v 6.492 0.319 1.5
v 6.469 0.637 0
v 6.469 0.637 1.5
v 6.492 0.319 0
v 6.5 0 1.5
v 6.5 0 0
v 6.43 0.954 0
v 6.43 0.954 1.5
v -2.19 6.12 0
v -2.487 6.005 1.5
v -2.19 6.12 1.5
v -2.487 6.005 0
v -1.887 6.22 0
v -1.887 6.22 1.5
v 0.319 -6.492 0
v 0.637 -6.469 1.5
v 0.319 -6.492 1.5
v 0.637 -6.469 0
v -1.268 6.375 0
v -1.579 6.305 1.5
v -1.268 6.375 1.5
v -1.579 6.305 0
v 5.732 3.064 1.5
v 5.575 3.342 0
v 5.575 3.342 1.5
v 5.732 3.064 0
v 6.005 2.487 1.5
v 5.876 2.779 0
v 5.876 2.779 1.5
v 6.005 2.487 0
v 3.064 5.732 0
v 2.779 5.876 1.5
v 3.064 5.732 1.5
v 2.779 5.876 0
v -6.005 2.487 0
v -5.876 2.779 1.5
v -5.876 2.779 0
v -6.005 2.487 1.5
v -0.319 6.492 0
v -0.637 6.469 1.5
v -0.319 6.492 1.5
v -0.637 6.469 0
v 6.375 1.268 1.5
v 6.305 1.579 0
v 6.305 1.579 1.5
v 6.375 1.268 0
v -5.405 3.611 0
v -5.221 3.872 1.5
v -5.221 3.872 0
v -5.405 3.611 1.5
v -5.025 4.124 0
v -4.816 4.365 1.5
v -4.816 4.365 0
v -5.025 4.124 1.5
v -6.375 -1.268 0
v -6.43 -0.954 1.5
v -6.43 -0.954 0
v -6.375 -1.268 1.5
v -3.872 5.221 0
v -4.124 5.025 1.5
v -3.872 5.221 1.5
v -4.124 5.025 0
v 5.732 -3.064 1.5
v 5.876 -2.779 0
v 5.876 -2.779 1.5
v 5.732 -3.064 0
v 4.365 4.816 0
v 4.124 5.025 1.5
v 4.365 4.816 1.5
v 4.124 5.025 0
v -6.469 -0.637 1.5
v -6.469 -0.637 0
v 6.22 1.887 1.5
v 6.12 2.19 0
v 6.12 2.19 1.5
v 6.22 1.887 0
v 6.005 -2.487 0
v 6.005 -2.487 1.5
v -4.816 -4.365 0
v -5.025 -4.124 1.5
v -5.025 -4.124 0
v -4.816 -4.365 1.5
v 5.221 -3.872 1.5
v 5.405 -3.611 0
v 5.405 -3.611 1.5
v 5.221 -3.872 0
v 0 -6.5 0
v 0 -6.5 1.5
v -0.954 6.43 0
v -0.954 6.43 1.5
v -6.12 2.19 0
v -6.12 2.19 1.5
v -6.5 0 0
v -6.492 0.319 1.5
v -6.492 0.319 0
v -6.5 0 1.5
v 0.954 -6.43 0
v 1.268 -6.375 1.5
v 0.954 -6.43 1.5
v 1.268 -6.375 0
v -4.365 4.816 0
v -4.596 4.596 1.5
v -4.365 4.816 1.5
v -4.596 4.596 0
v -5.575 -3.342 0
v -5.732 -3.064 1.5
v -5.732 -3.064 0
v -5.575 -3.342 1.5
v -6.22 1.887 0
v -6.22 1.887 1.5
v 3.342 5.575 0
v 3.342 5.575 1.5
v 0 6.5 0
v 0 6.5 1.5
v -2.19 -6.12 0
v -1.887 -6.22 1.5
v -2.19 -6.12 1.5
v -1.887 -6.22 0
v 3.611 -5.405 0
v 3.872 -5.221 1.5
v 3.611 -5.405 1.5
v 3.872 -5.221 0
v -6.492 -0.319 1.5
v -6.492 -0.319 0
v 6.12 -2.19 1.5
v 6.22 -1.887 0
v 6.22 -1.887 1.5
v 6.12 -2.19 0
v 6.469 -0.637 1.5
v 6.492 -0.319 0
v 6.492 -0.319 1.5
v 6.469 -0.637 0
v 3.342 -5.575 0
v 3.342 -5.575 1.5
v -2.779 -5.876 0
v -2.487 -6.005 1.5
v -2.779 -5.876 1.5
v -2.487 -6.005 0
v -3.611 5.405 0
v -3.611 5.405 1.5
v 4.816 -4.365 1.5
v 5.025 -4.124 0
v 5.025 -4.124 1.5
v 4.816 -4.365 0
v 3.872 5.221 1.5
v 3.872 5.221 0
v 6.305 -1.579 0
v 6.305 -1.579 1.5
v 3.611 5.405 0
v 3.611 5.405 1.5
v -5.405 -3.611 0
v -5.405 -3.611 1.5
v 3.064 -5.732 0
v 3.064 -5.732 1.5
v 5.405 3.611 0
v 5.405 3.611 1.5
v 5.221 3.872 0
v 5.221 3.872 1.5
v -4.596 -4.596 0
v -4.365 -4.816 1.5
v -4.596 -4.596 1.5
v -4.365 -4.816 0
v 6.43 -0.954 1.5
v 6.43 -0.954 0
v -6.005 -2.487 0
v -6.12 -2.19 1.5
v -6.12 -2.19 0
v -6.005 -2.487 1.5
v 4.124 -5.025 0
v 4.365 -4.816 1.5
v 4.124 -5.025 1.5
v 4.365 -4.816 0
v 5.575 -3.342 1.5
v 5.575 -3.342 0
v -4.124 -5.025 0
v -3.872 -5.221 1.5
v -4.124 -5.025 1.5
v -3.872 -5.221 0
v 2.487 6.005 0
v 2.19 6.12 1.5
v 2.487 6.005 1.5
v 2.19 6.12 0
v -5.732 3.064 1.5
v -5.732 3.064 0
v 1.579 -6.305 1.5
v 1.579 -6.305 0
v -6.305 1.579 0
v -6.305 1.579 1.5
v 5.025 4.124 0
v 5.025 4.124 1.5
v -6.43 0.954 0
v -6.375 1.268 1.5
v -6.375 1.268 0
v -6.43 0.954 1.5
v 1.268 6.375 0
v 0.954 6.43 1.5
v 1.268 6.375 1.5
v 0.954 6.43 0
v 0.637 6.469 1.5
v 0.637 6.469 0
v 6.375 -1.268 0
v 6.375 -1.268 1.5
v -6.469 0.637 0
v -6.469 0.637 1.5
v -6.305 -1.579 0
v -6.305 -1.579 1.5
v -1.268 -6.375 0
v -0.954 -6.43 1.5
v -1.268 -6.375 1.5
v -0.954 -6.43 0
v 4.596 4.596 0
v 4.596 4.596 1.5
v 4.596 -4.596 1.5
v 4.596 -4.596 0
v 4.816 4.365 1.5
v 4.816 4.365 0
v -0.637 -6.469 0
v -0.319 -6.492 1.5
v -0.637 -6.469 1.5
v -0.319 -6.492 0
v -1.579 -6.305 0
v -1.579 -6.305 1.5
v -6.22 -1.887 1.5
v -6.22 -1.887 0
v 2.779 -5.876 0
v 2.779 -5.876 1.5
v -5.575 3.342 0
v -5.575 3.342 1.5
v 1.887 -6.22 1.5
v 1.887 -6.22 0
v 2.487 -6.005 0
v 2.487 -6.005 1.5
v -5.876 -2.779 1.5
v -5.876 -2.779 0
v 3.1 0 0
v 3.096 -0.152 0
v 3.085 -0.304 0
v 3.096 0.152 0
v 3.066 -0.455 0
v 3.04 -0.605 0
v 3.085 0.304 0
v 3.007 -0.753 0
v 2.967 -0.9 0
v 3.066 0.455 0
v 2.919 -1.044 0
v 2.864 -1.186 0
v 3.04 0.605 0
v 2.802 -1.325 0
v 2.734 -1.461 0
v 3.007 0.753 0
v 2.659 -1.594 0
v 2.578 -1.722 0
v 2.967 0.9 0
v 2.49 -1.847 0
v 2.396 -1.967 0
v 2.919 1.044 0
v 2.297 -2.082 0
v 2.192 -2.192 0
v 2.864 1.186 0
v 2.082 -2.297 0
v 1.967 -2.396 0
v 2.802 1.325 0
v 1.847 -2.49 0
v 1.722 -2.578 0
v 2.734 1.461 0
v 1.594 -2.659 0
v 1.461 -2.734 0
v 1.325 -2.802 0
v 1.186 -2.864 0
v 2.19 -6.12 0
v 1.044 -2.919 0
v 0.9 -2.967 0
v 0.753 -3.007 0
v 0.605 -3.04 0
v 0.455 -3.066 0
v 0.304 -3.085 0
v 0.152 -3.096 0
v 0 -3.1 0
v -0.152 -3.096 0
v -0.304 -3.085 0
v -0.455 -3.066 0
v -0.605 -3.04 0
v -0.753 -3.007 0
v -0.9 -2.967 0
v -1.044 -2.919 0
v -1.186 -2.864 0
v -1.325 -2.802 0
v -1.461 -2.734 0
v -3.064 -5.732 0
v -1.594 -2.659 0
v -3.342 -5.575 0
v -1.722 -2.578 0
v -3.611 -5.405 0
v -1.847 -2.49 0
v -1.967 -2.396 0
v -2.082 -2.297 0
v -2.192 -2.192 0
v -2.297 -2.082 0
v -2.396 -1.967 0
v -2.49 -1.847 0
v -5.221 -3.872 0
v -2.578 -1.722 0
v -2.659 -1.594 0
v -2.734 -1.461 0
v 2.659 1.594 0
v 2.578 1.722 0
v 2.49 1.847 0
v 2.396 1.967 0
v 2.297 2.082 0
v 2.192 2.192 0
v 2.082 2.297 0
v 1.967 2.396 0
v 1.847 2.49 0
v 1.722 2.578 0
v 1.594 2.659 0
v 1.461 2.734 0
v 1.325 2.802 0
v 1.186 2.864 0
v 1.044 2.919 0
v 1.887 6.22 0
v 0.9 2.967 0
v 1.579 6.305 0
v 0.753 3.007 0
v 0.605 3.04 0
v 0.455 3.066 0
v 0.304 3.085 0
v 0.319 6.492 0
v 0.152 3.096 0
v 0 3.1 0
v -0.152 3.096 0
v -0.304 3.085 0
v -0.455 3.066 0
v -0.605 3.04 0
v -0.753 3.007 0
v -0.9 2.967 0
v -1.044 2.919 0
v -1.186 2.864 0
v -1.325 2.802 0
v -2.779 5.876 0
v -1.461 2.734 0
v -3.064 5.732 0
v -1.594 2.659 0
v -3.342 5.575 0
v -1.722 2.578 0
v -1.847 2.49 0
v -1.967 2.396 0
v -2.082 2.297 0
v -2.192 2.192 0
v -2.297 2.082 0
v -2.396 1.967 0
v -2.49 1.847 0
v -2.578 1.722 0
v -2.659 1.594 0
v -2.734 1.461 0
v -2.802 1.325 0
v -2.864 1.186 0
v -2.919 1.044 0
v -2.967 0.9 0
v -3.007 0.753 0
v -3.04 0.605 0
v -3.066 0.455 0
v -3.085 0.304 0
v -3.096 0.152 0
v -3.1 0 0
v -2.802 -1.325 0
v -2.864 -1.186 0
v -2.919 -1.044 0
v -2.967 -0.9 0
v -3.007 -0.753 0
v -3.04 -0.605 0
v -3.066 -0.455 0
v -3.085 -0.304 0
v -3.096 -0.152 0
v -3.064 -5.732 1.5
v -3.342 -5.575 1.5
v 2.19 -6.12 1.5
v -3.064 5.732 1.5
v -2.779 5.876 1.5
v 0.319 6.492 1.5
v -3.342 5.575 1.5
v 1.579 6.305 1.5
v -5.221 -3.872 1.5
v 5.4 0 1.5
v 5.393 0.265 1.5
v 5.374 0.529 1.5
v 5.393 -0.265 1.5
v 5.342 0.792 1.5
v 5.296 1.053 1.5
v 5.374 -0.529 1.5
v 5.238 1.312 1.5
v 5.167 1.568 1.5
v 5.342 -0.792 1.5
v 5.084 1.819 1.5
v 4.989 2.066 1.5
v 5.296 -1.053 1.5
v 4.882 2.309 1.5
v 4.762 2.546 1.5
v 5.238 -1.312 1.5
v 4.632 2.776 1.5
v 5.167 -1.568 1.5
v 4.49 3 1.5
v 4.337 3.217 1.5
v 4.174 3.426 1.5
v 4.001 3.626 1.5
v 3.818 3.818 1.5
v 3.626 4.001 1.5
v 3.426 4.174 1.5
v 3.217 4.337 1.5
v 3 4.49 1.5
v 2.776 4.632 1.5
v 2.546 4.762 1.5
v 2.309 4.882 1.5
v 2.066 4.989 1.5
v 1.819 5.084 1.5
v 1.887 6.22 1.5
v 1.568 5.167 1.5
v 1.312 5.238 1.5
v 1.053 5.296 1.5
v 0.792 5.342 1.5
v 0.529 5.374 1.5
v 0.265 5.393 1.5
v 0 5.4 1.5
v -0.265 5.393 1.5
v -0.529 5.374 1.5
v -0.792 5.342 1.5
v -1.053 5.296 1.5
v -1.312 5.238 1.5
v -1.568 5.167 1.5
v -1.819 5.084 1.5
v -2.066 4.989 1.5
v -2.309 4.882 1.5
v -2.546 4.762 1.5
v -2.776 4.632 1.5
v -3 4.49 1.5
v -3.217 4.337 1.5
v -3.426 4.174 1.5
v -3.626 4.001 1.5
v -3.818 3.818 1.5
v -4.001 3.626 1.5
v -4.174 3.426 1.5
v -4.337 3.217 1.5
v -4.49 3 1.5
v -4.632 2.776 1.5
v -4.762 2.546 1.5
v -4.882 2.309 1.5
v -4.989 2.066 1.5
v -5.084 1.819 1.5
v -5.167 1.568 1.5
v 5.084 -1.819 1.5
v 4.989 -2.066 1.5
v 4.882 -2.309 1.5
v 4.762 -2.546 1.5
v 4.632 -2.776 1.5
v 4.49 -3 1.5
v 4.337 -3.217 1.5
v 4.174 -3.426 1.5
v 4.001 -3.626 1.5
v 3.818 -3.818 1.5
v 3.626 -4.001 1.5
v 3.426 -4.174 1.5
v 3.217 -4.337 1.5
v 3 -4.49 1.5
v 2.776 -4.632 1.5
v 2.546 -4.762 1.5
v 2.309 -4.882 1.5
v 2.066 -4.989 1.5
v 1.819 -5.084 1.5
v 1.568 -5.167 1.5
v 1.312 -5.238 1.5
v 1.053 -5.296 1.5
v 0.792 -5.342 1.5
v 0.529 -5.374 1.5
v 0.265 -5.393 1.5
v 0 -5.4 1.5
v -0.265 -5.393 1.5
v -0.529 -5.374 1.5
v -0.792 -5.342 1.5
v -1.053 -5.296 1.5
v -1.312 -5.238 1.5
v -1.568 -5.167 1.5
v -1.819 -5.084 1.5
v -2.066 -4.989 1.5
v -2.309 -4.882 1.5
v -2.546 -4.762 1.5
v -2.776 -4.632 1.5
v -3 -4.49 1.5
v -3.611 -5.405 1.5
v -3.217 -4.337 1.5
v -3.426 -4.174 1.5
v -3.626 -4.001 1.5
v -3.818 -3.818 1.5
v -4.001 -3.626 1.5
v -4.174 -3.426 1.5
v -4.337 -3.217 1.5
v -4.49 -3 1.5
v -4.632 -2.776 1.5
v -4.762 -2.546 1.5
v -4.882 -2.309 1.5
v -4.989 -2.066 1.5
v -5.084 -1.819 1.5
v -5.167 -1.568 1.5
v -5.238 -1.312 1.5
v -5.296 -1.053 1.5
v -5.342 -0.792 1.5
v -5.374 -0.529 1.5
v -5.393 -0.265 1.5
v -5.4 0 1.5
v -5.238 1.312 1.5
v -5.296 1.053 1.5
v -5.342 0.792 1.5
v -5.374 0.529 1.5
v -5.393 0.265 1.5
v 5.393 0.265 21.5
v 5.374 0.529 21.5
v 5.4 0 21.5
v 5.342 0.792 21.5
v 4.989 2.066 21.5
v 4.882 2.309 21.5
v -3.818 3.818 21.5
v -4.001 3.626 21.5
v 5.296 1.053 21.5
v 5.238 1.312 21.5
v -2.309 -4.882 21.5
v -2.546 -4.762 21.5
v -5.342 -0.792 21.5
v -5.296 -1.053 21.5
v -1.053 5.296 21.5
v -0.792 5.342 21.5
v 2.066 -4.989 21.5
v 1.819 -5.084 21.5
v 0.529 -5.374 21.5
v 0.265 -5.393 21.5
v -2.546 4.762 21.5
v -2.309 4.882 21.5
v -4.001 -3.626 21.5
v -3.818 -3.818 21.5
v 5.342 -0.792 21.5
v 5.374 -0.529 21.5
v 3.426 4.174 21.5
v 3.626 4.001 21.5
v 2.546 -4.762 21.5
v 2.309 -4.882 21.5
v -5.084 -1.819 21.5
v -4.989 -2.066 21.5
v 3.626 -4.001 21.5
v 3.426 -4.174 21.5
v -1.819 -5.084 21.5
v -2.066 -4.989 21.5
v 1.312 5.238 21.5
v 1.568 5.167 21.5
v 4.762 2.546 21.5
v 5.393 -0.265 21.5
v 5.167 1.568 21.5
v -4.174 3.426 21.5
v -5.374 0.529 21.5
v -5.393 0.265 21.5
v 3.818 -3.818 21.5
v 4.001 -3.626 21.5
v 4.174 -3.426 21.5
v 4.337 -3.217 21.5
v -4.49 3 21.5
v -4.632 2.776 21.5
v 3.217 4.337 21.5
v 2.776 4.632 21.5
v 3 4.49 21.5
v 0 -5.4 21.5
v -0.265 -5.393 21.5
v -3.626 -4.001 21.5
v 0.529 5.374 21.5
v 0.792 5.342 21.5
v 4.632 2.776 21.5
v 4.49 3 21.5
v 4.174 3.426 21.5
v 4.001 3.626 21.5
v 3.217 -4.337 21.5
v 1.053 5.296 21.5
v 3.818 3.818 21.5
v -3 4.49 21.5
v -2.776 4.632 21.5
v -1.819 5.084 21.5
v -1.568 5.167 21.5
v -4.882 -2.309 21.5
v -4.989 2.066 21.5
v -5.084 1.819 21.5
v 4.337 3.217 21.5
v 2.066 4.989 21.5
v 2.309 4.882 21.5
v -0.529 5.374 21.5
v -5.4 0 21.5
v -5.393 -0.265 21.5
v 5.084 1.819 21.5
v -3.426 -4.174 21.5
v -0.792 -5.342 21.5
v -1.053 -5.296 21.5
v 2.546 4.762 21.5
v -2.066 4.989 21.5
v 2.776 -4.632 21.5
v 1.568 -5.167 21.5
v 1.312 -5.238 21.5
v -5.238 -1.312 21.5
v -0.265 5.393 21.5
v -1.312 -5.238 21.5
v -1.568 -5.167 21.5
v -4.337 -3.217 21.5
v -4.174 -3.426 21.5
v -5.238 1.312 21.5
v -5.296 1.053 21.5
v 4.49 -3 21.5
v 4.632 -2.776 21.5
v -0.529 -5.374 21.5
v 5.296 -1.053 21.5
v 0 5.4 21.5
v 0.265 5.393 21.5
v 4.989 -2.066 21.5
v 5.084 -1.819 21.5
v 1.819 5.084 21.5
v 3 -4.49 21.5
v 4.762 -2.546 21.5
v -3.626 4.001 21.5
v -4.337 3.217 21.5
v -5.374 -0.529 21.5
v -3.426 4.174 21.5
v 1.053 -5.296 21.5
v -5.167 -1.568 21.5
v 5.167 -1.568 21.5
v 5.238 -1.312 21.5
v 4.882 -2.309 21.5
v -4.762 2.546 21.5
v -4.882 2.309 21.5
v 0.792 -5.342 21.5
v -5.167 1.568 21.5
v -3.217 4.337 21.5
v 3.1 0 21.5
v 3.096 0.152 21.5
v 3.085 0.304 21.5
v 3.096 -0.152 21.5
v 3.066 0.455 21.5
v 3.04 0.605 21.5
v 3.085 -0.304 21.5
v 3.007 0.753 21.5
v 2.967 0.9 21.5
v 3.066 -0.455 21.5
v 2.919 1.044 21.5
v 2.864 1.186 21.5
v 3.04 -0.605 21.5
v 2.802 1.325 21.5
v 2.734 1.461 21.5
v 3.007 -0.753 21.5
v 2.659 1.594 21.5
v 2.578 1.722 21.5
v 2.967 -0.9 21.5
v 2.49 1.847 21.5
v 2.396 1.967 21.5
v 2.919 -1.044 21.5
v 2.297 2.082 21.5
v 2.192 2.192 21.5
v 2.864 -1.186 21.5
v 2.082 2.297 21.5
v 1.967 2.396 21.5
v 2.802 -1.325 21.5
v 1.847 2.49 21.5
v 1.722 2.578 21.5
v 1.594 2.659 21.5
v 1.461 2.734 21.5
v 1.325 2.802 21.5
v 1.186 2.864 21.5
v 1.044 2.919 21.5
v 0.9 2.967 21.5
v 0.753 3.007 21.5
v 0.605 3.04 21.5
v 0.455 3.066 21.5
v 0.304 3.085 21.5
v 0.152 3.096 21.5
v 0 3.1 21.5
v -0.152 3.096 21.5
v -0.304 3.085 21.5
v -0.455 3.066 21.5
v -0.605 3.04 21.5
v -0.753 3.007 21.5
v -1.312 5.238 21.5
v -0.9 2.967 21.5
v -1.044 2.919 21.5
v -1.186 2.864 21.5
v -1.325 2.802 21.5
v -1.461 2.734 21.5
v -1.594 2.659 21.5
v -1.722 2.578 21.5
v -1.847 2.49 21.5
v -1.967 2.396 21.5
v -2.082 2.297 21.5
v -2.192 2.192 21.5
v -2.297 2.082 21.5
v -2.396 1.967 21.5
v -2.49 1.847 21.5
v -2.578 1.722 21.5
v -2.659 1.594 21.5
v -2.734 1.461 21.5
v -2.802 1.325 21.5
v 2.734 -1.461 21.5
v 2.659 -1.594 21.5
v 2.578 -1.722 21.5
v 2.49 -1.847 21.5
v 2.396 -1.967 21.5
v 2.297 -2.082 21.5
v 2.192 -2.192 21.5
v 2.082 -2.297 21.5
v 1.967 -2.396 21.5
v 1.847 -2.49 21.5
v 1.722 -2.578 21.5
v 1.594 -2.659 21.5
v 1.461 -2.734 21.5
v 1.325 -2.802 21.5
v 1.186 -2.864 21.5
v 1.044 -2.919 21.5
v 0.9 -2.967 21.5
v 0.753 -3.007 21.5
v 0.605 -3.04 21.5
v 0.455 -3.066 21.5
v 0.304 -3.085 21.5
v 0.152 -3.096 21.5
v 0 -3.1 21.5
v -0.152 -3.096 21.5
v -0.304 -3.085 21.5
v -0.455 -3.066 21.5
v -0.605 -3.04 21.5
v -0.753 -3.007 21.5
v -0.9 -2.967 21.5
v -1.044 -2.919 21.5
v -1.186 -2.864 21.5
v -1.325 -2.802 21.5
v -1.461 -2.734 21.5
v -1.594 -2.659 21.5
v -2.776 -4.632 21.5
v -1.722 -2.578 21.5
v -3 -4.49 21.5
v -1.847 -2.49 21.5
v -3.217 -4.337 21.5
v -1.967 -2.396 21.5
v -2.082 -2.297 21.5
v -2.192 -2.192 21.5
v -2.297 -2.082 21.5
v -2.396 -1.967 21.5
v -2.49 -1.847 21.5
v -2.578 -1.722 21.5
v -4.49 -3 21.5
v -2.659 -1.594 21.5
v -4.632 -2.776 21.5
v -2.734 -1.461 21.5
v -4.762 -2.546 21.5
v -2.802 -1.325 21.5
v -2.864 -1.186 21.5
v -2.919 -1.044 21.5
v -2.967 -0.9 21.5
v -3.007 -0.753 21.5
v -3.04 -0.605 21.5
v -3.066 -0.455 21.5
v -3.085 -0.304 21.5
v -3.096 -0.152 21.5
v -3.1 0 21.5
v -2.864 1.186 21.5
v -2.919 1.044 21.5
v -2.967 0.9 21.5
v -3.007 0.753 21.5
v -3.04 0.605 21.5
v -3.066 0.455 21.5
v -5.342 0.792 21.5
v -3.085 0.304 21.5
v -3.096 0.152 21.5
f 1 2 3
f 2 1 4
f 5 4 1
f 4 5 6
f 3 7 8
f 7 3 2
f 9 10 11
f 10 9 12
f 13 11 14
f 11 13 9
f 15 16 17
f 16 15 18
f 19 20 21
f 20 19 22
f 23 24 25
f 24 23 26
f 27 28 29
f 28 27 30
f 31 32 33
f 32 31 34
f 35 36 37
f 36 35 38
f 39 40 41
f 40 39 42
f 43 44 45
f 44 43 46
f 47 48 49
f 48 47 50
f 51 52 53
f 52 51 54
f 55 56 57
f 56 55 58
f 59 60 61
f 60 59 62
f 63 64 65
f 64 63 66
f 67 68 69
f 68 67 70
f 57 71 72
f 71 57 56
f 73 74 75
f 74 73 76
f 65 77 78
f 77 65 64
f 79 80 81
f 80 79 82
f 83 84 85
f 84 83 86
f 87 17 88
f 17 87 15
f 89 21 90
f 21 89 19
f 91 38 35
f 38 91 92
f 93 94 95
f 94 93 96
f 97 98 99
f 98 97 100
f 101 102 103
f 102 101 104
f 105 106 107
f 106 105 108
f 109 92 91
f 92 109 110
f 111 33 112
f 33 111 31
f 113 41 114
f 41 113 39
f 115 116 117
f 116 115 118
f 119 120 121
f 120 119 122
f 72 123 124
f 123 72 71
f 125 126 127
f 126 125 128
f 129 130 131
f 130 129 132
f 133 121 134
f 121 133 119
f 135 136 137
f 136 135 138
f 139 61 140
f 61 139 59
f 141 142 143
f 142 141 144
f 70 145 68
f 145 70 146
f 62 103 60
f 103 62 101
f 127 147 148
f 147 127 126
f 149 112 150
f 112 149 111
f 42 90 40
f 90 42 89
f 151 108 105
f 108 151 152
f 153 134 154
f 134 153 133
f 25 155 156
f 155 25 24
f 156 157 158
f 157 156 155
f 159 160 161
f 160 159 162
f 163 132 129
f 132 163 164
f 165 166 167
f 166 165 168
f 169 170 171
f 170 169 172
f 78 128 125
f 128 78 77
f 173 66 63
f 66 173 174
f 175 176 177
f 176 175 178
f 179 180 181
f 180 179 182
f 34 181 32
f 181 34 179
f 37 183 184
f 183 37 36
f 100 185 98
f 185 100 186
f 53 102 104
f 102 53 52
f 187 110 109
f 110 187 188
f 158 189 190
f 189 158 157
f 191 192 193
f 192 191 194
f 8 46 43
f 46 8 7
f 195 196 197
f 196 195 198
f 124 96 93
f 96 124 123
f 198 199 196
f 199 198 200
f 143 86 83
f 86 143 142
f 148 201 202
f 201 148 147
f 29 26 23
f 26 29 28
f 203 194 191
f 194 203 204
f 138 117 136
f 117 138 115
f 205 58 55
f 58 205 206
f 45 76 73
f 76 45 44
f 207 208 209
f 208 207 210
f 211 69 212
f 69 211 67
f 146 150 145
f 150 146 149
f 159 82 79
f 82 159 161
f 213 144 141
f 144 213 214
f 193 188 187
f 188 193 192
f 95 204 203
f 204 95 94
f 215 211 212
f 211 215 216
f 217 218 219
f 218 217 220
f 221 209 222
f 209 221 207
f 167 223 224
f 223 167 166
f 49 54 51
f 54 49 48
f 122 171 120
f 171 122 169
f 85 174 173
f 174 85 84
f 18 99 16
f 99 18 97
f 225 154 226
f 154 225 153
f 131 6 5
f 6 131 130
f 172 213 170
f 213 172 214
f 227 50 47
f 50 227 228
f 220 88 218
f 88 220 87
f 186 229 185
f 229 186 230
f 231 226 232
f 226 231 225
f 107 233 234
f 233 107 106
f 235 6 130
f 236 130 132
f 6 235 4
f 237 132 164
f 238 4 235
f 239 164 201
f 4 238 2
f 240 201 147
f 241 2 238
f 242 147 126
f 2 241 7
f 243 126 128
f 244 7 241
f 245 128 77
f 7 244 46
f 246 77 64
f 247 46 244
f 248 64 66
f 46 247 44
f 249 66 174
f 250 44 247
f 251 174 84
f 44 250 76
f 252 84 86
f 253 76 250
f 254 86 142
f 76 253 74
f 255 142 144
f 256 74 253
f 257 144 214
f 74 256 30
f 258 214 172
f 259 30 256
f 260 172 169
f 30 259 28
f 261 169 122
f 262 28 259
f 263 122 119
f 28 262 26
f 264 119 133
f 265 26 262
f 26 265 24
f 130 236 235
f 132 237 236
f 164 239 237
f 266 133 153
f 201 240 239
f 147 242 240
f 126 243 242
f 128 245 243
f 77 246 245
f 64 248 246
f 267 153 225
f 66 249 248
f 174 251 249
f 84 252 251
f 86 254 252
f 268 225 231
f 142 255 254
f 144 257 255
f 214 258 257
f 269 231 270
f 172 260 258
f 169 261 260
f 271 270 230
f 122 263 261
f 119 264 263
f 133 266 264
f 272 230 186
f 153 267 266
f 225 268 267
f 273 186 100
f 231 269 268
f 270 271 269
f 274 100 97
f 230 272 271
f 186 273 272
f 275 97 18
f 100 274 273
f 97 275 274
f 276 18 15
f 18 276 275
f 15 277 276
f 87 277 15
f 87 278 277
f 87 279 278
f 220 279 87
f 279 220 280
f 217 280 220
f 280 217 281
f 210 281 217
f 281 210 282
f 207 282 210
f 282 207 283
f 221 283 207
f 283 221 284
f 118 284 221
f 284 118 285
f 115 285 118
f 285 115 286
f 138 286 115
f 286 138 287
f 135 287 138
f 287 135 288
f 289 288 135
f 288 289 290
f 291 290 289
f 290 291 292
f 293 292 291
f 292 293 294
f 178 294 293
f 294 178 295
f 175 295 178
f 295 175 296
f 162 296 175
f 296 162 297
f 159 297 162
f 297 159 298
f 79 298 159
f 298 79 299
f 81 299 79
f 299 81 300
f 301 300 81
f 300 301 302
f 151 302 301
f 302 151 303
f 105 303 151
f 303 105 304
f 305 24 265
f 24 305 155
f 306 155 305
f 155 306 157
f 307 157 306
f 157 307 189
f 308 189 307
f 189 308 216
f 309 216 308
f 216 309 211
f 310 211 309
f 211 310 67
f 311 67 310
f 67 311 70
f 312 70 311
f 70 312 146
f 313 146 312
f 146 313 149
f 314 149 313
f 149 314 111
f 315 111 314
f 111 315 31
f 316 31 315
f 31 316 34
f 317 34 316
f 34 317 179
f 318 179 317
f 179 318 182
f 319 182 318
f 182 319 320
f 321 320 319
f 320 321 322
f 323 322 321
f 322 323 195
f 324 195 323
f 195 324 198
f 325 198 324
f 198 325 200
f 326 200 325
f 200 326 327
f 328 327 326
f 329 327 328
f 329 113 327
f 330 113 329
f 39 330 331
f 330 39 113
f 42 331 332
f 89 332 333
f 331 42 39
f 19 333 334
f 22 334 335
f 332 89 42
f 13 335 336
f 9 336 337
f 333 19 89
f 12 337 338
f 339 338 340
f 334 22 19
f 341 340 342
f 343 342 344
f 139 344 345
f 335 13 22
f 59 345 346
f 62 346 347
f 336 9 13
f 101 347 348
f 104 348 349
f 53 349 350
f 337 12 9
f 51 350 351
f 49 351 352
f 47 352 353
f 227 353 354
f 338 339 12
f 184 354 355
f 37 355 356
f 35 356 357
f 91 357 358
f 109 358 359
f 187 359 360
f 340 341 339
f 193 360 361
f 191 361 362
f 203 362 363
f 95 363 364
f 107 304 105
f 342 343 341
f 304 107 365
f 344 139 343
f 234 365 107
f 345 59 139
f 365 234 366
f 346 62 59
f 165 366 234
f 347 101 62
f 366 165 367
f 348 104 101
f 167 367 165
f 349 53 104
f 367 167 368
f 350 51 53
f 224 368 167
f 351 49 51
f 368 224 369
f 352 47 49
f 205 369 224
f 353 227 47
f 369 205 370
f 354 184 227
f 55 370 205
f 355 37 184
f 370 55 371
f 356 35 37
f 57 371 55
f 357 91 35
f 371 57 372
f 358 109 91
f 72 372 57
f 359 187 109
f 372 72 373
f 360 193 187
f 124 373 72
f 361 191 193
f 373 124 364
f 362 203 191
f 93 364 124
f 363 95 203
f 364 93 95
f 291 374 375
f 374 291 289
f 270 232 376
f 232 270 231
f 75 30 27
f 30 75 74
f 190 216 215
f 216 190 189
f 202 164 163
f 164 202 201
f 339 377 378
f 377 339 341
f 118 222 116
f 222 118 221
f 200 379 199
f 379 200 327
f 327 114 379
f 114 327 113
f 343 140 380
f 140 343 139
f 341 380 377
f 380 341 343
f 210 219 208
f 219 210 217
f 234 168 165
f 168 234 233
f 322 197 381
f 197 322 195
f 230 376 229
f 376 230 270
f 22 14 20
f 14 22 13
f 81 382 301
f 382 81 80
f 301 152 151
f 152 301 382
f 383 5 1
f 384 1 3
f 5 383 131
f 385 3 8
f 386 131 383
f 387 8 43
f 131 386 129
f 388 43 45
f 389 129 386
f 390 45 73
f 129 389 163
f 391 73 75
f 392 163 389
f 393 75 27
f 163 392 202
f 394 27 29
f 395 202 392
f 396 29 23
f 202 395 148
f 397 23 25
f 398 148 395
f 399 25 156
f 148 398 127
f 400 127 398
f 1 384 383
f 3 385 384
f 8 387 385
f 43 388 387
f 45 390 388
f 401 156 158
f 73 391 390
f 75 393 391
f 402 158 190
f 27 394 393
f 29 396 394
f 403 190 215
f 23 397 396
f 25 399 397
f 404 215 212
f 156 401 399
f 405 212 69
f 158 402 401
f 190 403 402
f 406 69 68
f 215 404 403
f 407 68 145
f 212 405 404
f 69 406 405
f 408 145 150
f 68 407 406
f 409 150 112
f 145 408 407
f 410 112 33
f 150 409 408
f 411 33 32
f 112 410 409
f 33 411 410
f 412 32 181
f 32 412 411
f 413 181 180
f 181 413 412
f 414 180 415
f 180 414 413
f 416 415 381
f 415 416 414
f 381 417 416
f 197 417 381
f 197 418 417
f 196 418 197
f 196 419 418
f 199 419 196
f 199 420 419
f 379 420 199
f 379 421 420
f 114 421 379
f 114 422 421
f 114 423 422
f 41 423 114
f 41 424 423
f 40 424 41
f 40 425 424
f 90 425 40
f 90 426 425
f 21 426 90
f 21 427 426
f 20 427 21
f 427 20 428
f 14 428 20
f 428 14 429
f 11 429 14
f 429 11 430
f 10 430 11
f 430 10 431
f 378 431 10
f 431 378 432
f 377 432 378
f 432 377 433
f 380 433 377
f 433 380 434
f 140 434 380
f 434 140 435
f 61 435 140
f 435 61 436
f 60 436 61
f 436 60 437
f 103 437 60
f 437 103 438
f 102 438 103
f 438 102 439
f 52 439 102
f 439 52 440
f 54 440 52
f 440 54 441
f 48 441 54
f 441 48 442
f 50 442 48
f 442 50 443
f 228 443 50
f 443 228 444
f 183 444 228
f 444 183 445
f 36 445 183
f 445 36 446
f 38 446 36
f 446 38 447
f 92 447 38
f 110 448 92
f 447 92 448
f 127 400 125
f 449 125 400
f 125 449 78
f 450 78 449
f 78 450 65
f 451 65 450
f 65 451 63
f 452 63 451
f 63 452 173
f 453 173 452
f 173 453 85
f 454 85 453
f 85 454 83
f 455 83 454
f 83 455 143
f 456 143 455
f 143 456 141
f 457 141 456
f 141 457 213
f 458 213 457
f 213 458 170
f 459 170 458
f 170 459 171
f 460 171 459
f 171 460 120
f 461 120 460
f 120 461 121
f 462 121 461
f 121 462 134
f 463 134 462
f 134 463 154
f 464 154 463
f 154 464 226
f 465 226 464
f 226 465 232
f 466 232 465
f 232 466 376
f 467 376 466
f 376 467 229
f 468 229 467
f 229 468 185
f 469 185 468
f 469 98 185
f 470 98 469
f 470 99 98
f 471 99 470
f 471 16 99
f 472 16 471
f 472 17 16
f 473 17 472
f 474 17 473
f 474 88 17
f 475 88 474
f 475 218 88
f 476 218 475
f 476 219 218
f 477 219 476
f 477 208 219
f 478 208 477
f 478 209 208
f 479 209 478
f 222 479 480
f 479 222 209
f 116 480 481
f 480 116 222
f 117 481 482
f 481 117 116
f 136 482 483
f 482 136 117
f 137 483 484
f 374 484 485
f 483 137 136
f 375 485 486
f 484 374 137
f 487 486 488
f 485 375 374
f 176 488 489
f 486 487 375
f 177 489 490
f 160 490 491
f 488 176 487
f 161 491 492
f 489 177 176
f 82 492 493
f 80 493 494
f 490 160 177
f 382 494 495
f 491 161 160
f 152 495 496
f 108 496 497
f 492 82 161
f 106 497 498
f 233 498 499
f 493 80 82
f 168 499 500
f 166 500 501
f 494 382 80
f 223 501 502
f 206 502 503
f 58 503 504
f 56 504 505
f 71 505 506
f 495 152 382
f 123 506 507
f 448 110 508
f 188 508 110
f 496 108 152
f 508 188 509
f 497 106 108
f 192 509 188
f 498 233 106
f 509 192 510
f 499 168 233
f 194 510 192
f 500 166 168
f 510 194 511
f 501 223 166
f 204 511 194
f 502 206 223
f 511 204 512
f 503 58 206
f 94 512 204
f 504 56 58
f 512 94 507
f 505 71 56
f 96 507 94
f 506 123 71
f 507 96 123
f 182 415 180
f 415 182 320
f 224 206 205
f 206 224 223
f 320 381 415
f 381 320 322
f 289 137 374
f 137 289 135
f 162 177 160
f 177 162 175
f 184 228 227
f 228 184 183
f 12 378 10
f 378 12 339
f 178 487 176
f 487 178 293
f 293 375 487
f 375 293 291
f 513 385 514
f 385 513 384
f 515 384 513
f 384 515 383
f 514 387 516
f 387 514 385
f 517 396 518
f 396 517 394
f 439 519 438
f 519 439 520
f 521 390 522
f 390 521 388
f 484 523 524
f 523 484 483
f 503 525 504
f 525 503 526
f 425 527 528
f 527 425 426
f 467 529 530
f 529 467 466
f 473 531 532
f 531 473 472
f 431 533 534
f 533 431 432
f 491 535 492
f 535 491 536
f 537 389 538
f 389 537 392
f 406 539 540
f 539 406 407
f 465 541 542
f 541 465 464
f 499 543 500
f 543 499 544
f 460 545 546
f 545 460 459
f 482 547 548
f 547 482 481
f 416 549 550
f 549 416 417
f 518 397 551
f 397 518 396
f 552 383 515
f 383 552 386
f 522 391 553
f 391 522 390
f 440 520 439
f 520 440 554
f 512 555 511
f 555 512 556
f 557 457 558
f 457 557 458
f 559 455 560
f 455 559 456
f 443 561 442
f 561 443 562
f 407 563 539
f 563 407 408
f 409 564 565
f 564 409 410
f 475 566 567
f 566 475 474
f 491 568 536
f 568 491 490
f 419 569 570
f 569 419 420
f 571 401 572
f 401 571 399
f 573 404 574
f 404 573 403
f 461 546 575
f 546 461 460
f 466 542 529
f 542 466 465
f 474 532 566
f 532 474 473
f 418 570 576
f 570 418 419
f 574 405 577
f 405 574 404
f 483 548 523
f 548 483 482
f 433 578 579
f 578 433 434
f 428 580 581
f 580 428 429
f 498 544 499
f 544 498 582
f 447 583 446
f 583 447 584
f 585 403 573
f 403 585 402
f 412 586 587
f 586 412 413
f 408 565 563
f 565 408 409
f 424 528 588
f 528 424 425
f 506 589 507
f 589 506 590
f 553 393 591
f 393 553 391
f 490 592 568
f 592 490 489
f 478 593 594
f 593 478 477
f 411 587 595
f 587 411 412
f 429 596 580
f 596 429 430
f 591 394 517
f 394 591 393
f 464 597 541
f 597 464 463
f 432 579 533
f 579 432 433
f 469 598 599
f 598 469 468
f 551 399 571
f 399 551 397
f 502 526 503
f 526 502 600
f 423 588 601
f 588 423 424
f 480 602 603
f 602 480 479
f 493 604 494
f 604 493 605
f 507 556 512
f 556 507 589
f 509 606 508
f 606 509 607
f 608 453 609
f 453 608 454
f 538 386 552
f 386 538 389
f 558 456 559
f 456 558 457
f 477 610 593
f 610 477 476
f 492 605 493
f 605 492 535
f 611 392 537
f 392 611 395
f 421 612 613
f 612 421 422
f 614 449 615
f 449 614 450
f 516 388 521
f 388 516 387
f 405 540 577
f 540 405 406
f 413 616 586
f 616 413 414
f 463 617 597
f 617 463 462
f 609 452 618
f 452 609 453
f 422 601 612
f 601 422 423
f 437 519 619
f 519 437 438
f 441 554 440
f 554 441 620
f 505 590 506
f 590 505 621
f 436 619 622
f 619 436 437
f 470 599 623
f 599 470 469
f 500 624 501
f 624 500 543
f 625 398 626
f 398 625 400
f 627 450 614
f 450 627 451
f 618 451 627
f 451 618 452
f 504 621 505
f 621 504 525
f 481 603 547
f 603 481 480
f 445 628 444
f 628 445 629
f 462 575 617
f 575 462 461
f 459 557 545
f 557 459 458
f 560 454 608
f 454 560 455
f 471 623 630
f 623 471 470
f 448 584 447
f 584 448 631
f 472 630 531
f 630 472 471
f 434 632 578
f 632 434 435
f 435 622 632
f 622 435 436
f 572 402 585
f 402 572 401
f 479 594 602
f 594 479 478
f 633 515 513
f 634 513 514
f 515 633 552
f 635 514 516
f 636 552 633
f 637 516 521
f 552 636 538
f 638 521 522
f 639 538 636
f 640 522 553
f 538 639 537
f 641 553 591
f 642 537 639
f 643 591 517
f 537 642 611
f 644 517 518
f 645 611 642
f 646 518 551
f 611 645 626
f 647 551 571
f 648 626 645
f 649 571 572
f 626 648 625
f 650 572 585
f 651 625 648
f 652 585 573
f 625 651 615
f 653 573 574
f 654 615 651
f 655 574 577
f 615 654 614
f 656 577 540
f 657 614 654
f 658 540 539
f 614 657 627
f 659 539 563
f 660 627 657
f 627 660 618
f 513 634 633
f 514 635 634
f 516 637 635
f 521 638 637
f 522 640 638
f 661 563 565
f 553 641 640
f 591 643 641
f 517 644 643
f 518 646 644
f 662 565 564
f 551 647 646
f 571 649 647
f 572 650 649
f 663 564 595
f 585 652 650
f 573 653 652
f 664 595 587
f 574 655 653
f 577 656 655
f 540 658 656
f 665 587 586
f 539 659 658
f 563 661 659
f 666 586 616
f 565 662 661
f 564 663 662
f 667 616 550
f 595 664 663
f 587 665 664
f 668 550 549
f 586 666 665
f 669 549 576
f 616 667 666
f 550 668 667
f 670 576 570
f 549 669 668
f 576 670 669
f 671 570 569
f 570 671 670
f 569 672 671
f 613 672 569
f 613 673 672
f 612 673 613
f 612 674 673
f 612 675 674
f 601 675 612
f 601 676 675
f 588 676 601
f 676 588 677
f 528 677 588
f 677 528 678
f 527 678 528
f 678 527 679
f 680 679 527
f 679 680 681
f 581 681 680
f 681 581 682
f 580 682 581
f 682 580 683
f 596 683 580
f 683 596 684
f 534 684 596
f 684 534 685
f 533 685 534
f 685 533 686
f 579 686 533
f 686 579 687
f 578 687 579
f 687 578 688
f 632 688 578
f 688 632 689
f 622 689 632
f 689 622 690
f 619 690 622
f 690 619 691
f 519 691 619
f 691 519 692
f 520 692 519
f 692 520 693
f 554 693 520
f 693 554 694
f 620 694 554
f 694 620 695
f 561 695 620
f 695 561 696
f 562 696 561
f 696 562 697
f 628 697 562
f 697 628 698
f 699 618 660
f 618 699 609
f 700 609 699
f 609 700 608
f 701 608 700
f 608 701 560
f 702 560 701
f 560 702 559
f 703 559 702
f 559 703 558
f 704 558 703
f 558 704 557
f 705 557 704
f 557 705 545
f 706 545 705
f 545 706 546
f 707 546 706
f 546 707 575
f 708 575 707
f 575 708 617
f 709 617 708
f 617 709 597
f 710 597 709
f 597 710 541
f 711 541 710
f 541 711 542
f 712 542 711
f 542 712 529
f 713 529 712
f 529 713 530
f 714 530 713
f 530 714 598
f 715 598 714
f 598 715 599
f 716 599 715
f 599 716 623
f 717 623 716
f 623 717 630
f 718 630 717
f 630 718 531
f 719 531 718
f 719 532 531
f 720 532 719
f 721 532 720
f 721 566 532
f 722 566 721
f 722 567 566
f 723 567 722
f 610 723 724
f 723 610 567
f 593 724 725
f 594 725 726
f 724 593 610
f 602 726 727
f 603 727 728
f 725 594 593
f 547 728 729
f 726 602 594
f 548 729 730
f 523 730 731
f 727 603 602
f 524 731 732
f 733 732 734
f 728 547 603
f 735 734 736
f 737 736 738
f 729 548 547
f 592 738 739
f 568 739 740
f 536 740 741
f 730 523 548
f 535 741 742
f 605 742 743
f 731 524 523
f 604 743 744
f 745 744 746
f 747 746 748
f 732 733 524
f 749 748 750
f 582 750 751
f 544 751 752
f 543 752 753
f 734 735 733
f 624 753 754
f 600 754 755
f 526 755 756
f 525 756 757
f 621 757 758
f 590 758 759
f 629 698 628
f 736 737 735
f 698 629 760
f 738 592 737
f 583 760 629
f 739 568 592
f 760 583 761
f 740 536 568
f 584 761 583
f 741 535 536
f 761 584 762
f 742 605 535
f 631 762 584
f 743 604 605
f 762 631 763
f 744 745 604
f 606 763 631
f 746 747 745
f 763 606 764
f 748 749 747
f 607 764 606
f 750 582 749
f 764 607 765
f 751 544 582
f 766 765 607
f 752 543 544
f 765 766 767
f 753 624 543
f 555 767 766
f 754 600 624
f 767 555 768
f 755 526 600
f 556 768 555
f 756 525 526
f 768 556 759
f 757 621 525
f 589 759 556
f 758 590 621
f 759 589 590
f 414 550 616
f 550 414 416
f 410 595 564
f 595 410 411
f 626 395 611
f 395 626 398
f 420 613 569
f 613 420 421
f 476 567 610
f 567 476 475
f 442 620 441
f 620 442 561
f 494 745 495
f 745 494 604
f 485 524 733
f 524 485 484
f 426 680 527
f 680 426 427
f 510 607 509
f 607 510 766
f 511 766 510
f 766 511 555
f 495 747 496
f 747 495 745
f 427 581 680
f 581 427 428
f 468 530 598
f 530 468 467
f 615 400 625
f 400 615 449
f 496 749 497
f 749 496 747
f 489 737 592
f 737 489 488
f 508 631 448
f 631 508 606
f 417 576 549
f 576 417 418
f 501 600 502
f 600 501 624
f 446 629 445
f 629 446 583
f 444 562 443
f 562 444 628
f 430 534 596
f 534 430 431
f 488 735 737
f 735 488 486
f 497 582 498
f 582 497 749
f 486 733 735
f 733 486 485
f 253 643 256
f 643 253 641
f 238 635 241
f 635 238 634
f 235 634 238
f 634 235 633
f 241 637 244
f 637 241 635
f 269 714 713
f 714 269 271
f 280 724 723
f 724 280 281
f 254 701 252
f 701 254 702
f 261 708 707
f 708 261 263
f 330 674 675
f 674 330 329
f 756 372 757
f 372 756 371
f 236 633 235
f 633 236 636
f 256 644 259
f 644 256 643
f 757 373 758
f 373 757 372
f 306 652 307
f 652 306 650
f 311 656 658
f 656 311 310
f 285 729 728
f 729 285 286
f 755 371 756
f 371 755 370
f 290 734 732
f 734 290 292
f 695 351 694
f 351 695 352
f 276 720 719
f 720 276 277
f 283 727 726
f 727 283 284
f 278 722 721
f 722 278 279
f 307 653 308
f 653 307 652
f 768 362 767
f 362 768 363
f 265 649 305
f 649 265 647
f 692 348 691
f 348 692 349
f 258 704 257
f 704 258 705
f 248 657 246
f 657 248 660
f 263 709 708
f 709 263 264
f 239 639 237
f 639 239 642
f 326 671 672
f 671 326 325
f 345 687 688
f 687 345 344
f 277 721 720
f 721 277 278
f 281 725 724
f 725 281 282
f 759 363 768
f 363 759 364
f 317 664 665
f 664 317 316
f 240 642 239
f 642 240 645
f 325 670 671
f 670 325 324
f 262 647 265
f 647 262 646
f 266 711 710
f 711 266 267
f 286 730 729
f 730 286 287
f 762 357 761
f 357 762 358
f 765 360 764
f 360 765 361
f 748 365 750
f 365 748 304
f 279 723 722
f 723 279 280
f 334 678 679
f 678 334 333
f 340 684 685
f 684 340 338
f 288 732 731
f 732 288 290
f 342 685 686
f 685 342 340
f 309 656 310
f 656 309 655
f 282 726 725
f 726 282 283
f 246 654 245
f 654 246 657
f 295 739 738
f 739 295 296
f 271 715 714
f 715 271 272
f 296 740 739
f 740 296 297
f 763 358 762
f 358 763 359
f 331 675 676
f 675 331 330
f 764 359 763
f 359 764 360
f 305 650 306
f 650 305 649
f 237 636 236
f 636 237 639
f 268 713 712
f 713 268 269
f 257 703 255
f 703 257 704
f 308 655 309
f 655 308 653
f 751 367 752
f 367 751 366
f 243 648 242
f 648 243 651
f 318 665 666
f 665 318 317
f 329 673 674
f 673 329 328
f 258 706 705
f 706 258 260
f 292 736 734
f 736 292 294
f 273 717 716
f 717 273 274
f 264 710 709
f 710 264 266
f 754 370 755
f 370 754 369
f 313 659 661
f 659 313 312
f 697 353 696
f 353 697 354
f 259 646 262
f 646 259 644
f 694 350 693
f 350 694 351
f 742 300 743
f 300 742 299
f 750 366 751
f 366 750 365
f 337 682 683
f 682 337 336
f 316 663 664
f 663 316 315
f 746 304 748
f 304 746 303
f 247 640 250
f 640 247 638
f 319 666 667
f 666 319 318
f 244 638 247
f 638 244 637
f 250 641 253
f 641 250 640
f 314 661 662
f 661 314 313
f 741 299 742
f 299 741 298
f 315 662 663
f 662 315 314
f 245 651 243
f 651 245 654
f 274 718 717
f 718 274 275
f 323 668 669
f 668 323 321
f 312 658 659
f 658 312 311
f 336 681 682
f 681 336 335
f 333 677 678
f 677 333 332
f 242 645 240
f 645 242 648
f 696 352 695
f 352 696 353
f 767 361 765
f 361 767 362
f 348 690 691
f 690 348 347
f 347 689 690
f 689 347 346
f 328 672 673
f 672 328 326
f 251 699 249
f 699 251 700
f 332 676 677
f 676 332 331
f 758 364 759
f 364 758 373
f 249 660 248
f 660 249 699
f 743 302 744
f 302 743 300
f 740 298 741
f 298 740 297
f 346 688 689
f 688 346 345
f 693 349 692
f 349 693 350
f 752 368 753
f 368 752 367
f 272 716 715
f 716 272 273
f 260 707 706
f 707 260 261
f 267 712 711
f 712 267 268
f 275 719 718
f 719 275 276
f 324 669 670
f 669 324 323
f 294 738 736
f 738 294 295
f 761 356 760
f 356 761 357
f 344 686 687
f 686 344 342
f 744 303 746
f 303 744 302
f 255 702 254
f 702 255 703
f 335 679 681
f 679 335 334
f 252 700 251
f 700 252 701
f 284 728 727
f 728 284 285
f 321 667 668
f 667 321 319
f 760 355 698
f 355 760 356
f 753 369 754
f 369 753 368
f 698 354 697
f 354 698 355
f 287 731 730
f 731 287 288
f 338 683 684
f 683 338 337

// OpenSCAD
// Parameters (mm)
collar_diameter = 13;          // outer diameter of the bottom collar
collar_thickness = 1.5;        // thickness of the collar (z = 0 → 1.5)
sleeve_outer_diameter = 10.8; // outer diameter of the sleeve body
sleeve_height = 20.0;          // height of the sleeve body (z = 1.5 → 21.5)
total_height = collar_thickness + sleeve_height; // overall part height = 21.5 mm
bore_diameter = 6.2;           // diameter of the straight bore
clearance = 0.01;              // extra length beyond each face for clean cuts

// Set resolution for curved features
$fn = 128;

// Collar (cylinder, sits on the bed)
module collar() {
    cylinder(d = collar_diameter, h = collar_thickness, center = false);
}

// Sleeve body (cylinder, starts at collar top)
module sleeve_body() {
    translate([0, 0, collar_thickness])
        cylinder(d = sleeve_outer_diameter, h = sleeve_height, center = false);
}

// Complete part before bore
module raw_part() {
    union() {
        collar();
        sleeve_body();
    }
}

// Bore that cuts through the whole part
module bore() {
    // Height extends clearance beyond both ends
    bore_height = total_height + 2*clearance;
    translate([0, 0, -clearance])
        cylinder(d = bore_diameter, h = bore_height, center = false);
}

// Final printable part
difference() {
    raw_part();
    bore();
}
